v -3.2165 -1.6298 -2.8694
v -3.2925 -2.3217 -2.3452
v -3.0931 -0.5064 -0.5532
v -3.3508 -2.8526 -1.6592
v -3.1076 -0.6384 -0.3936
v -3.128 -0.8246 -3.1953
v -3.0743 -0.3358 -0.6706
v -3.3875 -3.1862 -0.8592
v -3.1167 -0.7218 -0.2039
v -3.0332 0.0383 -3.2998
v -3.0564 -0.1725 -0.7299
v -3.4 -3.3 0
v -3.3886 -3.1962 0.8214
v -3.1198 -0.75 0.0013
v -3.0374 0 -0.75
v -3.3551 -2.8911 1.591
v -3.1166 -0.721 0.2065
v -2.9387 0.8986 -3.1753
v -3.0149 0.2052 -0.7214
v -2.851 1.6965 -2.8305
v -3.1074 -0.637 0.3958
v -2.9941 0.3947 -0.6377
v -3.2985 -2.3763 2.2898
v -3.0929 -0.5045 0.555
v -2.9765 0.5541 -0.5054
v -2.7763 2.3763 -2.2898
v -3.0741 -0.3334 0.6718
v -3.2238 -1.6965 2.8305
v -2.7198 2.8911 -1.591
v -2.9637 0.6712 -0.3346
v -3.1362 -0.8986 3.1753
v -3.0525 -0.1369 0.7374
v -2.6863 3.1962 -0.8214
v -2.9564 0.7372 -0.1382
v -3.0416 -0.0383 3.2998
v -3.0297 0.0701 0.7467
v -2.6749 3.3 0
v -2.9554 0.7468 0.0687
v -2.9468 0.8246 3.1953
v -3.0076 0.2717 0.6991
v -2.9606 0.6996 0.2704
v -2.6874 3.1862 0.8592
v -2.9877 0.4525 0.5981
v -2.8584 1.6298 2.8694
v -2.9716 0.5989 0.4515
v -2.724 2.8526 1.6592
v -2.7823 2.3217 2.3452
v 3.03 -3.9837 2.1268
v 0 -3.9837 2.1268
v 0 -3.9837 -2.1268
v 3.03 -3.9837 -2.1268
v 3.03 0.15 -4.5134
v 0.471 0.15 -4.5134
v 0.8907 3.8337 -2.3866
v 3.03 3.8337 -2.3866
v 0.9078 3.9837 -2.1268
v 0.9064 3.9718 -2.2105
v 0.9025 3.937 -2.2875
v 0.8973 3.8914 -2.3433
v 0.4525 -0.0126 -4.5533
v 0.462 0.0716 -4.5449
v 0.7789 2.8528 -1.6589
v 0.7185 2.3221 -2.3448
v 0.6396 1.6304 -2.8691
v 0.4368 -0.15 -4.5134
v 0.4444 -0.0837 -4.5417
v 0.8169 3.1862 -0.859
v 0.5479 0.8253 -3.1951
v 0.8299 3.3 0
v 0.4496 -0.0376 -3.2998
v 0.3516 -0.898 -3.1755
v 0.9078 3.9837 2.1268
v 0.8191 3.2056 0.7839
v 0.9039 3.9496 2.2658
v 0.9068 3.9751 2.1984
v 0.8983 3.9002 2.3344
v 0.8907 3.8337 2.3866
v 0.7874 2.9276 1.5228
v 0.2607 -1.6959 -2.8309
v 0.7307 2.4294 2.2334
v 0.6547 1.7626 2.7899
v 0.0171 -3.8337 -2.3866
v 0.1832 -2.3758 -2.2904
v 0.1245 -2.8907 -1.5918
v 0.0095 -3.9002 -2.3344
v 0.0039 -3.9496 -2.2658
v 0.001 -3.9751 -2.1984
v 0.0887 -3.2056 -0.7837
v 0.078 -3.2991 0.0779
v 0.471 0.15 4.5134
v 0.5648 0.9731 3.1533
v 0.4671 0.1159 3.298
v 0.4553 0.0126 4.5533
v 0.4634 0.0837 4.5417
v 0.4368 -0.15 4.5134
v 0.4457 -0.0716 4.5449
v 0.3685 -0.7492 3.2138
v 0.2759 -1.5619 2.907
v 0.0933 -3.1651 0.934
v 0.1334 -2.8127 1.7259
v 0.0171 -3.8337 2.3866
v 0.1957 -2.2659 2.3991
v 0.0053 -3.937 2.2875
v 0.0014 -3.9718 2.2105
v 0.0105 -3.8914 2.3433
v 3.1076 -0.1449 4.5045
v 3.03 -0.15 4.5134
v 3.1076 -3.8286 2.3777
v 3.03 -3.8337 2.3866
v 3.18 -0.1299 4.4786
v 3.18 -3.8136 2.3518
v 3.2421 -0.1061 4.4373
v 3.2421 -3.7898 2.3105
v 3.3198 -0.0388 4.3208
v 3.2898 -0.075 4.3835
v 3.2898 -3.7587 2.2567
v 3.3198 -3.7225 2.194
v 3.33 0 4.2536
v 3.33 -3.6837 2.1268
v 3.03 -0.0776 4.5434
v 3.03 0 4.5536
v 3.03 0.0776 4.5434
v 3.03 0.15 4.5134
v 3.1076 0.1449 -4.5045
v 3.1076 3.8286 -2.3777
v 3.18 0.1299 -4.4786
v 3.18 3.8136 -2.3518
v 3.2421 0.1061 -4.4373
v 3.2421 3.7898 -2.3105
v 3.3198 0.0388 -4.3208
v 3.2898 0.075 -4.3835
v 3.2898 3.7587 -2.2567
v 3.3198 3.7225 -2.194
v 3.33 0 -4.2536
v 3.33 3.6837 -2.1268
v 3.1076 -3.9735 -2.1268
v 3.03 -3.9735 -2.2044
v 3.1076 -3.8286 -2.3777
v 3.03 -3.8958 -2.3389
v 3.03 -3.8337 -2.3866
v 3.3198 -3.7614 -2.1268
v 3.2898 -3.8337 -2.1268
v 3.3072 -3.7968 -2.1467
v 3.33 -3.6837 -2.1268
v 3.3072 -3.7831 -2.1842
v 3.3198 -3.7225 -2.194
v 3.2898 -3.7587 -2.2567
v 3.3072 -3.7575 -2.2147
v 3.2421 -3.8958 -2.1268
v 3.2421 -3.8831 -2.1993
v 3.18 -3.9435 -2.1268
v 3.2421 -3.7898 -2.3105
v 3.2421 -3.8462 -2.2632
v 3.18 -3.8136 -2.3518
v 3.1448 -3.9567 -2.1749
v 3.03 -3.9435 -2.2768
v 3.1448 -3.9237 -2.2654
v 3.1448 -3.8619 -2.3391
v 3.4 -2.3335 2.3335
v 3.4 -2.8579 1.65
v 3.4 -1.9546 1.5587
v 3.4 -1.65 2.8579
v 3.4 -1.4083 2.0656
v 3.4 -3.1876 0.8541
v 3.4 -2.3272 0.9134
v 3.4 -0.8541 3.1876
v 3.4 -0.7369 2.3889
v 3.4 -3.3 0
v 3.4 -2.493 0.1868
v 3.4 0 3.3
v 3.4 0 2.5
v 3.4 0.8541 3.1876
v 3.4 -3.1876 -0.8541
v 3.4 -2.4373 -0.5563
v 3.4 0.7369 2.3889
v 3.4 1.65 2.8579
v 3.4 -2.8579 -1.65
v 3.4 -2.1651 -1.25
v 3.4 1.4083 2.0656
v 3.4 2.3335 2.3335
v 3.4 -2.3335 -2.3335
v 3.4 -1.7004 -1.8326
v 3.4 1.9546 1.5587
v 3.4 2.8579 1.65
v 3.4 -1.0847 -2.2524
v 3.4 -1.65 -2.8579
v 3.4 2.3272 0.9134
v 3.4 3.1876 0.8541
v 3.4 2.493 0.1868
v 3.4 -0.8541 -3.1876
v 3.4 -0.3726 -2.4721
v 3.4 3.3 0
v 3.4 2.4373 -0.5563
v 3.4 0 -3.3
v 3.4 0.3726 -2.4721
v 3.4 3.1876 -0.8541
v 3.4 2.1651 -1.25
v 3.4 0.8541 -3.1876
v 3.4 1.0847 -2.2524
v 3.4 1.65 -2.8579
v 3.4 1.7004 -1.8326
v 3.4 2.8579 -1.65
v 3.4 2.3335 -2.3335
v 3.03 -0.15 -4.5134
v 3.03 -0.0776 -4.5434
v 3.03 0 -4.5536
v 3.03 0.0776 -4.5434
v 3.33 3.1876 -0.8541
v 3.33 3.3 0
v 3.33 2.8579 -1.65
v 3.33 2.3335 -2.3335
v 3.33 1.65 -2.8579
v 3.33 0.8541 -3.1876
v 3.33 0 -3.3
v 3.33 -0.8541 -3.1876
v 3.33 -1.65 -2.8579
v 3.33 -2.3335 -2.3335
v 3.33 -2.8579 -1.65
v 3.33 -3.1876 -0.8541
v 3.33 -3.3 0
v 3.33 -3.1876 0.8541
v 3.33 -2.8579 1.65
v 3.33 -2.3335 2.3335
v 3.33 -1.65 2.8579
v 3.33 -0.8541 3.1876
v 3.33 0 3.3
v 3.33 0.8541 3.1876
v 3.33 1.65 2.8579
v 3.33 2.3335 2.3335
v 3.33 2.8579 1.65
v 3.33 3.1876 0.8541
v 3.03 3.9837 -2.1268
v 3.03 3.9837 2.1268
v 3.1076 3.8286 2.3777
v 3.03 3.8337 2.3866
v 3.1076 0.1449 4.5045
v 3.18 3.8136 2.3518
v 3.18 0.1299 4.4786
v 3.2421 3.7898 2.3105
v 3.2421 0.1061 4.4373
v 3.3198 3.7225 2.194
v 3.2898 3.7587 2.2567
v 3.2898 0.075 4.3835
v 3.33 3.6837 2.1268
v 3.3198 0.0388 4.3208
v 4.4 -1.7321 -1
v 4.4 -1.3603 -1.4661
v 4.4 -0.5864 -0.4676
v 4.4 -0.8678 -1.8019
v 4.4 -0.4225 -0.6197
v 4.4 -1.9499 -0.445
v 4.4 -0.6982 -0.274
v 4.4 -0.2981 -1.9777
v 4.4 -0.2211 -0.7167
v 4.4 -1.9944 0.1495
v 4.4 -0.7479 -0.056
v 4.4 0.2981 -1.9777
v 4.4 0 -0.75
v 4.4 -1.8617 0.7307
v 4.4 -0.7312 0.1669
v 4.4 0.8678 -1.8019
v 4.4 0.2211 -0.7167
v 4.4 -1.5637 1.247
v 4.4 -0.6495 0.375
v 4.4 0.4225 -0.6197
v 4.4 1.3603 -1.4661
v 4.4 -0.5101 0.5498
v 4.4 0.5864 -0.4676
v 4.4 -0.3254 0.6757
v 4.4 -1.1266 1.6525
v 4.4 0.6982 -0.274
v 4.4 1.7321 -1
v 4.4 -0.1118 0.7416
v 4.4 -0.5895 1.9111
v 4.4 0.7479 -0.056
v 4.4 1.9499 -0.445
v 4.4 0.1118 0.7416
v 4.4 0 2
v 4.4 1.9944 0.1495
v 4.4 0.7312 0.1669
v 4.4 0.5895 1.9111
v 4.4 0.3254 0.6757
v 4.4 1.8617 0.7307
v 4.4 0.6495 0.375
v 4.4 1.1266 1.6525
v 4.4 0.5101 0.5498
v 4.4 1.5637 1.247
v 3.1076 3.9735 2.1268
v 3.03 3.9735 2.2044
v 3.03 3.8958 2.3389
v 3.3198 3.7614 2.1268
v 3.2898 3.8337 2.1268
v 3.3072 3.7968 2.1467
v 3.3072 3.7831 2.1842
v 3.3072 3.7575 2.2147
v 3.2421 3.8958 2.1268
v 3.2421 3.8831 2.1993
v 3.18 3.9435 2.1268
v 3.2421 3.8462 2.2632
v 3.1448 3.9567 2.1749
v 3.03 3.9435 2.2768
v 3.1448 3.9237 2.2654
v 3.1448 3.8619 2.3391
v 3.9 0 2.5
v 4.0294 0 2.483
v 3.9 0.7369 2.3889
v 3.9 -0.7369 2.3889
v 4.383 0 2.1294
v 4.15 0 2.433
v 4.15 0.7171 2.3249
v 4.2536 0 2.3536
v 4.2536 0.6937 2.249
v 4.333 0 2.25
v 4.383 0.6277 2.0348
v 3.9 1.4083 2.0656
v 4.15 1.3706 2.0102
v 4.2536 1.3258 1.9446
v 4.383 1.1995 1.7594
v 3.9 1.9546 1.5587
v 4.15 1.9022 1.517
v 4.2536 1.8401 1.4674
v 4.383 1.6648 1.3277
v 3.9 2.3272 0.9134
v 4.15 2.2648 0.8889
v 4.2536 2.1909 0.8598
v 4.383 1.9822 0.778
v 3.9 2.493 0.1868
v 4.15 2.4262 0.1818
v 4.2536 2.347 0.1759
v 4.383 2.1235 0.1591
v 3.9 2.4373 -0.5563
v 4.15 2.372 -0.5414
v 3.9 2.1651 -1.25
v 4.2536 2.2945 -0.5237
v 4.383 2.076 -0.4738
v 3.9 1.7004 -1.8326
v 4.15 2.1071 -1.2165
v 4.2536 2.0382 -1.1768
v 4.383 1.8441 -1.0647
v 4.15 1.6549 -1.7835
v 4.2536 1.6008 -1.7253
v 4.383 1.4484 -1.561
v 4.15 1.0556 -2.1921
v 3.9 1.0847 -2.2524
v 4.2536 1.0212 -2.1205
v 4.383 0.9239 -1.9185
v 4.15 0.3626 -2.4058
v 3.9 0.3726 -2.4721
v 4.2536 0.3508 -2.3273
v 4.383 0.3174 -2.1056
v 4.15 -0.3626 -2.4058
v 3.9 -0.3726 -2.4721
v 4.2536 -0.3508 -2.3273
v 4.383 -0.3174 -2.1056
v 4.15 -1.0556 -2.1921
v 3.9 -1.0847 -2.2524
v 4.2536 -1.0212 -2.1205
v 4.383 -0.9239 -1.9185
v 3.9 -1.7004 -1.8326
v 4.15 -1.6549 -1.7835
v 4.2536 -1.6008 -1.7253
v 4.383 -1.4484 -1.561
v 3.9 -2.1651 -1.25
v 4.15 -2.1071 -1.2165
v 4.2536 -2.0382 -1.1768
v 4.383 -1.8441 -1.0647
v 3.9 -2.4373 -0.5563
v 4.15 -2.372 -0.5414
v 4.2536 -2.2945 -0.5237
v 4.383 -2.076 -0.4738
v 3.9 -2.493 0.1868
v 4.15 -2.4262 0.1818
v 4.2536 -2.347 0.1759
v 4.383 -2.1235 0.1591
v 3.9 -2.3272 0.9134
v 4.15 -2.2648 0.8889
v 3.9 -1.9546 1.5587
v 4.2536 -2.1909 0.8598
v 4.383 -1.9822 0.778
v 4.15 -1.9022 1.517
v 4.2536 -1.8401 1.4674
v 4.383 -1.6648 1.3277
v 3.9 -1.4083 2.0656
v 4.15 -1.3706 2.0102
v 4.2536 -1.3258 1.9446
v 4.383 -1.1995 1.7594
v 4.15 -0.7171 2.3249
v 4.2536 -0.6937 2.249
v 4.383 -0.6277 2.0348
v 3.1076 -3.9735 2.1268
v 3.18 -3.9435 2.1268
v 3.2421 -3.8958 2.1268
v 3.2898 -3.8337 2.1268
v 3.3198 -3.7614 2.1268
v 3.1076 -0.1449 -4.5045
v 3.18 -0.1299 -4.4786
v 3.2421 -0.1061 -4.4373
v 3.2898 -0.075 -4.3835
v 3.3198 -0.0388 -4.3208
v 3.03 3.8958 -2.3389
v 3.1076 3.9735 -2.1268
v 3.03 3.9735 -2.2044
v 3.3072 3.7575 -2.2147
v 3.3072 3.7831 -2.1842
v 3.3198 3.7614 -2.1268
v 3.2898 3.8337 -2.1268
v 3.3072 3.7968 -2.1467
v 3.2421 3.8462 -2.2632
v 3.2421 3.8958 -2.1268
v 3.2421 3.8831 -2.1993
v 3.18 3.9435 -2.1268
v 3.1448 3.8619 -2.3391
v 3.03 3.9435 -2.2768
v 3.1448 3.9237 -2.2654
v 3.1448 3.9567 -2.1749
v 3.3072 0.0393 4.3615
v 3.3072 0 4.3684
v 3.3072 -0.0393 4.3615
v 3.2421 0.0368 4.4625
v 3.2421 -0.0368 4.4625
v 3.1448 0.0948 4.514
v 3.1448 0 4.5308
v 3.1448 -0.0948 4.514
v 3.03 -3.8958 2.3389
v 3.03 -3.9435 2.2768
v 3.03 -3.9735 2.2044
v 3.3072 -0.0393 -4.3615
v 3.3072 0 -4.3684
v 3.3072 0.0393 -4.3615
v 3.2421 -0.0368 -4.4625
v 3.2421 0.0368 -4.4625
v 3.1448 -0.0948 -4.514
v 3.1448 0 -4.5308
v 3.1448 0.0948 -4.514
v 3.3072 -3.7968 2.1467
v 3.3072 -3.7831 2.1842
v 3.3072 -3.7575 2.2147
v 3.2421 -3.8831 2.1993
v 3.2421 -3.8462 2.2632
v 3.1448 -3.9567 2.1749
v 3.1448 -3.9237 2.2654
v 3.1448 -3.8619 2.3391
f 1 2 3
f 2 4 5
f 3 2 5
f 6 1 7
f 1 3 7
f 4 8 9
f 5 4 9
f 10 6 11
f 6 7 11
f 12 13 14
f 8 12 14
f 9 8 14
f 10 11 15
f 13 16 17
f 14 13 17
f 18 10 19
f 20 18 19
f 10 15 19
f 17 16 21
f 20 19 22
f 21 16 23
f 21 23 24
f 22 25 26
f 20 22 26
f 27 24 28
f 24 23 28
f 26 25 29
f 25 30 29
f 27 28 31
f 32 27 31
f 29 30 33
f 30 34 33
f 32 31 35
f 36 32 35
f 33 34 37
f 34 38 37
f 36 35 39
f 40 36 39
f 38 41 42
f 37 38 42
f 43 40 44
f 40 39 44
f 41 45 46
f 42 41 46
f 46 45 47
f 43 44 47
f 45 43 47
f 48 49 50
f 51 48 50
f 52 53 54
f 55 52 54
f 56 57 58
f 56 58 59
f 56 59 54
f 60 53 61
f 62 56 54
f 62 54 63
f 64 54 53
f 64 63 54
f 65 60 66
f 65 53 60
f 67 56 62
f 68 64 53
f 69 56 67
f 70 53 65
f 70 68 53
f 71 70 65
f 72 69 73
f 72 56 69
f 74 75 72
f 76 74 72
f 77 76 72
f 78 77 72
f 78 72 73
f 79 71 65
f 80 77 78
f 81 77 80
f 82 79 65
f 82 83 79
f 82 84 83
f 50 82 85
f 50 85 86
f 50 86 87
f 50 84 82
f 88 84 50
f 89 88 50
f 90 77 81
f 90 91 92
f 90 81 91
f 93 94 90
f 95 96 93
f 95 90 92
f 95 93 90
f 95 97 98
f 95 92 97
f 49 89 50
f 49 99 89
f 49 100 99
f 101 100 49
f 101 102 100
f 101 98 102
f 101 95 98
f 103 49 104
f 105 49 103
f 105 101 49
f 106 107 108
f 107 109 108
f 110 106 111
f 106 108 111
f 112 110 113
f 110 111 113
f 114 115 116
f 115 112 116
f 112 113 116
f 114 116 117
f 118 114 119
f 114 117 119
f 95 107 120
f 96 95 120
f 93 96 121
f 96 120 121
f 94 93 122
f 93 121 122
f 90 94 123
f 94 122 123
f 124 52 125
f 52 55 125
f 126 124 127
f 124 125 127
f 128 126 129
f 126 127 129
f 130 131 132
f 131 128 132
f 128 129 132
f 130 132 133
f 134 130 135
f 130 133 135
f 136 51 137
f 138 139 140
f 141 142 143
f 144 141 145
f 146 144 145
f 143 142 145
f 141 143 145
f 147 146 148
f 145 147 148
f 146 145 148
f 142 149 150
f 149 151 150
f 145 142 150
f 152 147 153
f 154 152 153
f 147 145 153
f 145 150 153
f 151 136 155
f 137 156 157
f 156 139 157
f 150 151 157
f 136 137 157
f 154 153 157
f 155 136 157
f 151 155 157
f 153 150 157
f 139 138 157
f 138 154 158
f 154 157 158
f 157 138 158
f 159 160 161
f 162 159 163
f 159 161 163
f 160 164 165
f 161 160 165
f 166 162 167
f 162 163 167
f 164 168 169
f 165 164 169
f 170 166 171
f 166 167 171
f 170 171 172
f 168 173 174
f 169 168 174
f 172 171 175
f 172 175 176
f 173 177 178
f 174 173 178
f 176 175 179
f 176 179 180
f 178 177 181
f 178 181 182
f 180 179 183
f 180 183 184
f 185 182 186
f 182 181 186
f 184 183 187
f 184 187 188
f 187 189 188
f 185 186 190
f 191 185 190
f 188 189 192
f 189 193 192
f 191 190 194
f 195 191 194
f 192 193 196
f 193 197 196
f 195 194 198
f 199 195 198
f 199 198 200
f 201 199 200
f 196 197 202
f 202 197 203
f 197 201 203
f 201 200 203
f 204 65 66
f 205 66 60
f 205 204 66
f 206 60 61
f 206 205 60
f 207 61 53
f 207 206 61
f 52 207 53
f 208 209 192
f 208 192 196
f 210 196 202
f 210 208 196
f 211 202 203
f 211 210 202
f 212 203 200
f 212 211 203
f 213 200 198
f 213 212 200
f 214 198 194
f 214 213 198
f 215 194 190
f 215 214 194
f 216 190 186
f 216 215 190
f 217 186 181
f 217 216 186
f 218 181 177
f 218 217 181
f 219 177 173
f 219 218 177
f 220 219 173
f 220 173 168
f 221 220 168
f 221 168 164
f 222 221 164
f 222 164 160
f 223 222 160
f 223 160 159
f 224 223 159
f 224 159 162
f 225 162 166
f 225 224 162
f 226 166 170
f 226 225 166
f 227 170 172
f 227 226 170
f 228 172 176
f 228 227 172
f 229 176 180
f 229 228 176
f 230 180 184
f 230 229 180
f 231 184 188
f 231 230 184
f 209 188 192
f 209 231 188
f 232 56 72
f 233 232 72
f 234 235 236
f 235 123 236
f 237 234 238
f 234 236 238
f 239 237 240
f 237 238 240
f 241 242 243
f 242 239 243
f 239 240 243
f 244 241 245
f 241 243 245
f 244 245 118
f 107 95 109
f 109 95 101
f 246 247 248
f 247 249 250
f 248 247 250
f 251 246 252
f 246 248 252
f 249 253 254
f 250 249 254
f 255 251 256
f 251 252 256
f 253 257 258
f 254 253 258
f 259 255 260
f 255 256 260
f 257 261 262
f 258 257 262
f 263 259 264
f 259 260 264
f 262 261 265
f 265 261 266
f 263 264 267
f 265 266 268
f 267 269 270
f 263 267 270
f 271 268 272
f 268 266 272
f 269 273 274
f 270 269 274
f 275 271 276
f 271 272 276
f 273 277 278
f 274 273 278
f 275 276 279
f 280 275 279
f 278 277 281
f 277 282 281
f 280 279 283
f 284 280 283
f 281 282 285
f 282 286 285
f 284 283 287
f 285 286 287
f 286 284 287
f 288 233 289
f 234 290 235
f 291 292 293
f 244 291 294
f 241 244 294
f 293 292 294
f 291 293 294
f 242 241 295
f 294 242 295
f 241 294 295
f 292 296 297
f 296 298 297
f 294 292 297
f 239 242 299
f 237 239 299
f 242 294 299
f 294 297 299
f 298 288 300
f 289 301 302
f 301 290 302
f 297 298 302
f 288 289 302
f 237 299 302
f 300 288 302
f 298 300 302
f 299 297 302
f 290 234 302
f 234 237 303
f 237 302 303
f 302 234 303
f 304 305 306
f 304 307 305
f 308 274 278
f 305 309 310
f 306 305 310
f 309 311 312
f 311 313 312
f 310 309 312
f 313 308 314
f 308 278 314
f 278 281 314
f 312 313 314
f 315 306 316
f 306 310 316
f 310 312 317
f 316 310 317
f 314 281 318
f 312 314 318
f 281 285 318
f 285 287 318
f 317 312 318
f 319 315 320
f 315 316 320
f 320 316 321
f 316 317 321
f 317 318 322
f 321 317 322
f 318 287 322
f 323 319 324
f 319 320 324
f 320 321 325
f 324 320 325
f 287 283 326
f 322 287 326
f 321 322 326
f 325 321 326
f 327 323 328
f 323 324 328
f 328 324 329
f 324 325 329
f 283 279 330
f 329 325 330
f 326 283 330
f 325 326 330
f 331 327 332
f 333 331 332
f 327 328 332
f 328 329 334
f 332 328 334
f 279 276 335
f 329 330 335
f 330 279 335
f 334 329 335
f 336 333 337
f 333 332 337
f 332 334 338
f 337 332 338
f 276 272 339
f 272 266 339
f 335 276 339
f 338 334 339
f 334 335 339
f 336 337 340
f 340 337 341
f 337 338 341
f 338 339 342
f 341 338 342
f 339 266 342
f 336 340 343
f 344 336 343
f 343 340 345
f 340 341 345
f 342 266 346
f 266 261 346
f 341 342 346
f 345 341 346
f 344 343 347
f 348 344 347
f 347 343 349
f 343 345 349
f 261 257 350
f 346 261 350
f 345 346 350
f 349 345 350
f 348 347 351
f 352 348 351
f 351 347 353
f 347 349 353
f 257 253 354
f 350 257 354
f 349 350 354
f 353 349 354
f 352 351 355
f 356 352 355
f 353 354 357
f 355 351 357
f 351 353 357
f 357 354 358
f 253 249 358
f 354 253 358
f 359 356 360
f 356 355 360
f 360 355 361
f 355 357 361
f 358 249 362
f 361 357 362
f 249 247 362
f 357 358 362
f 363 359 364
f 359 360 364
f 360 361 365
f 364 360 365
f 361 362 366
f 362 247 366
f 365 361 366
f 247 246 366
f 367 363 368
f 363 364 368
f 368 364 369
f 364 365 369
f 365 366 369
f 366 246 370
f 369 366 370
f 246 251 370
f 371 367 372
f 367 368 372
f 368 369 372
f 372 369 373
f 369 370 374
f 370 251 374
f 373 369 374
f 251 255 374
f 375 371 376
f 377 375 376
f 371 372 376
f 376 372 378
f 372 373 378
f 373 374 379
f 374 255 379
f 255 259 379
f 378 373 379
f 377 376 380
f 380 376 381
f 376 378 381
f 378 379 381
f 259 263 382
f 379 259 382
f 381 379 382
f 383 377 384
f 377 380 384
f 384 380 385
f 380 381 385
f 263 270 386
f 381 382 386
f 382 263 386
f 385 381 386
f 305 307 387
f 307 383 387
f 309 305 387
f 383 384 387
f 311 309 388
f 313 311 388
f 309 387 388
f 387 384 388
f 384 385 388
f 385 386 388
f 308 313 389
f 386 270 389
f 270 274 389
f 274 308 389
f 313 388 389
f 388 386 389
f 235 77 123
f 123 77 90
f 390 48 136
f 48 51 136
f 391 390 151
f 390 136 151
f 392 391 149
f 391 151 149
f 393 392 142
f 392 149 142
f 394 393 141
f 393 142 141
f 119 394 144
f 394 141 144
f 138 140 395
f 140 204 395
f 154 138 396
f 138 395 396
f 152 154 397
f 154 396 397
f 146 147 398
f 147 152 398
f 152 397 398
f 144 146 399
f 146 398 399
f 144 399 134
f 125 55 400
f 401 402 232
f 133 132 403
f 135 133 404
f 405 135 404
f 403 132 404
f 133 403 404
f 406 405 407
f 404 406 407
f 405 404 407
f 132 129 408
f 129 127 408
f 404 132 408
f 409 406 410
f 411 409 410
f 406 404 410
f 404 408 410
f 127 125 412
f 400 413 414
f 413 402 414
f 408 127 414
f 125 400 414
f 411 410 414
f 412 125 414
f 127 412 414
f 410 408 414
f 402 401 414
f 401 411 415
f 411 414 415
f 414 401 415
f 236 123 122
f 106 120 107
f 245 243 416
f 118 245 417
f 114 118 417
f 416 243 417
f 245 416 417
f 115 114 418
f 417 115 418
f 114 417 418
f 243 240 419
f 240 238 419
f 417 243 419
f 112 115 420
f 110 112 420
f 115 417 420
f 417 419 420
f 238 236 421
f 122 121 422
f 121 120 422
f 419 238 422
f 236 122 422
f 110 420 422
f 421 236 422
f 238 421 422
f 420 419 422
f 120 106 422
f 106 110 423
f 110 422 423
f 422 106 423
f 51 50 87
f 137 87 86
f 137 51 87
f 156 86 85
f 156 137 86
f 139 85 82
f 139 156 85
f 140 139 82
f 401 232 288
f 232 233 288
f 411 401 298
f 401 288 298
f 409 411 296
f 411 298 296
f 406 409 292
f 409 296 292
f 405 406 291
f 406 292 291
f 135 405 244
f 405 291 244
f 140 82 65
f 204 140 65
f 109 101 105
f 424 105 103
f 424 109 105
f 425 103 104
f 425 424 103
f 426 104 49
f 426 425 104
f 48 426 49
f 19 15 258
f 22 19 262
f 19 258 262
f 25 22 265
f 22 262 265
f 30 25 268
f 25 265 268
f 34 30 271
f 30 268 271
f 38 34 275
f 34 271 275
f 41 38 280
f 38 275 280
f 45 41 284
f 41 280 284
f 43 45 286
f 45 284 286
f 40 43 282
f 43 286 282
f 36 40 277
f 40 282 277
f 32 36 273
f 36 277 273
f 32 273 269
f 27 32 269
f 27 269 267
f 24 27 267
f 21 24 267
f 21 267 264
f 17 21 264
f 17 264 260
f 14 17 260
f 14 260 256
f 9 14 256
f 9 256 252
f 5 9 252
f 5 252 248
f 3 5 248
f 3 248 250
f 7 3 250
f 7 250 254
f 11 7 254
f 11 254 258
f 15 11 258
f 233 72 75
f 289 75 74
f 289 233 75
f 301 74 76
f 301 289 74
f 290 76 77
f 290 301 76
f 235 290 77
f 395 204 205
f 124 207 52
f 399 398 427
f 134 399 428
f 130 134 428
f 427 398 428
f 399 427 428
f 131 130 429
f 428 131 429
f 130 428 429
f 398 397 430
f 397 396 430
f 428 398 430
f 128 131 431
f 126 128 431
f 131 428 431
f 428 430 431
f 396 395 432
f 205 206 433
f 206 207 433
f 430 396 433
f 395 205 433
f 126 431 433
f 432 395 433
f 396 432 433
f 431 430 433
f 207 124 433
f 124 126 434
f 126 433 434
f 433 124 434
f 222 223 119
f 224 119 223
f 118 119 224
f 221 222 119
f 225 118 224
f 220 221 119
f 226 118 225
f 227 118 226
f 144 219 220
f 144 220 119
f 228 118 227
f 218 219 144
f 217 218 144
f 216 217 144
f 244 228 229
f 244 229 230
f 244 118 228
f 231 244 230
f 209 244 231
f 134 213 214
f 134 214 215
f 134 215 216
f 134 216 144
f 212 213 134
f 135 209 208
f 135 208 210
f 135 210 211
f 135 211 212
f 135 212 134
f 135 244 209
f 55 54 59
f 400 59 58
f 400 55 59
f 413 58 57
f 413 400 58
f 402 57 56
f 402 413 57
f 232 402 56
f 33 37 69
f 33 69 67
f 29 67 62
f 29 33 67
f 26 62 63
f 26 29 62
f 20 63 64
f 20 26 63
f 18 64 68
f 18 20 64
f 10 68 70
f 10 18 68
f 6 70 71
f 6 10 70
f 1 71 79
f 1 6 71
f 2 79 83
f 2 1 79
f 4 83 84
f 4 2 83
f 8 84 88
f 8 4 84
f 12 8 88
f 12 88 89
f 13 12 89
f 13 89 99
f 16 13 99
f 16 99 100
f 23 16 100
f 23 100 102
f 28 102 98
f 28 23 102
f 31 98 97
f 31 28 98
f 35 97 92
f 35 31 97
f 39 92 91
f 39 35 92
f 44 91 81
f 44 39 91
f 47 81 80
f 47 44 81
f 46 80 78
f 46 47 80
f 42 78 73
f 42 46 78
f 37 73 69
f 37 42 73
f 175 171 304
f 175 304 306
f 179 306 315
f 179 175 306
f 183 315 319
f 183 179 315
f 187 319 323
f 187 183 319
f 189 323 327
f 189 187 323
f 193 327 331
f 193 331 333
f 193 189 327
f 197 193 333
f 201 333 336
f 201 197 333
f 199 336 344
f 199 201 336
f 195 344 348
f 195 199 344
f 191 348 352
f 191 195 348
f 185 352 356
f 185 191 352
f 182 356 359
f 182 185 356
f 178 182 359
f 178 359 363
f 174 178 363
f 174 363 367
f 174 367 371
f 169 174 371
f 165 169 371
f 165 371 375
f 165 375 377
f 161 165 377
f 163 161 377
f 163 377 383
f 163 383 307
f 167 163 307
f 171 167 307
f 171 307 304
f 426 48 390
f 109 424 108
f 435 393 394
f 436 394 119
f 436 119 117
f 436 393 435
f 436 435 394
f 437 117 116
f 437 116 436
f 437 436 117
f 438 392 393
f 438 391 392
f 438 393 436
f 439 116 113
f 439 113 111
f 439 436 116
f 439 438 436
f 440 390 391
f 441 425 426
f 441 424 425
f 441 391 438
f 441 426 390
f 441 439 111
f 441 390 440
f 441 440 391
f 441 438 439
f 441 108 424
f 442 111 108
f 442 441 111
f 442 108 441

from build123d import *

# Parameters (mm, degrees)
SALIENTE_EXTRUIR1_DEPTH = 3.33
REDONDEO1_R             = 0.3
CORTAR_EXTRUIR3_DEPTH   = 9.95
CROQUIS2_R              = 3.3
SALIENTE_EXTRUIR4_DEPTH = 3.4
CROQUIS6_R              = 2.5
SALIENTE_EXTRUIR5_DEPTH = 7.8
REDONDEO3_R             = 0.5
CROQUIS7_R              = 0.75
CORTAR_EXTRUIR4_DEPTH   = 10.871432541
CORTAR_EXTRUIR5_DEPTH   = 3.9


with BuildPart() as part:
    # Croquis1 → Saliente-Extruir1 (new body)
    with BuildSketch(Plane(origin=(0, 0, 0), x_dir=(0, 0, -1), z_dir=(1, 0, 0))):
        Polygon((-4.6, 0), (-2.3, -3.983716857), (2.3, -3.983716857), (4.6, 0), (2.3, 3.983716857), (-2.3, 3.983716857), align=None)
    extrude(amount=SALIENTE_EXTRUIR1_DEPTH)

    # Redondeo1
    redondeo1_edges = [part.edges().sort_by_distance(p)[0] for p in [
        (1.665, 3.983716857, 2.3),
        (1.665, 3.983716857, -2.3),
        (1.665, 0, -4.6),
        (1.665, -3.983716857, -2.3),
        (1.665, -3.983716857, 2.3),
        (1.665, 0, 4.6),
        (3.33, -3.983716857, 0),
        (3.33, -1.991858429, -3.45),
        (3.33, 1.991858429, -3.45),
        (3.33, 3.983716857, 0),
        (3.33, 1.991858429, 3.45),
        (3.33, -1.991858429, 3.45),
    ]]
    fillet(redondeo1_edges, radius=REDONDEO1_R)

    # Croquis5 → Cortar-Extruir3 (cut, symmetric)
    with BuildSketch(Plane.XY):
        Polygon((0, -3.983716857), (-2.185194876, -3.983716857), (-2.185194876, 4.171179011), (0.929133021, 4.171179011), align=None)
    extrude(amount=CORTAR_EXTRUIR3_DEPTH, both=True, mode=Mode.SUBTRACT)

    # Croquis2 → Saliente-Extruir4 (add, symmetric)
    with BuildSketch(Plane.ZY):
        with Locations(Location((0, 0, 0), (0, 0, 90))):
            Circle(CROQUIS2_R)
    extrude(amount=SALIENTE_EXTRUIR4_DEPTH, both=True)

    # Croquis6 → Saliente-Extruir5 (add)
    with BuildSketch(Plane.ZY.offset(3.4)):
        Circle(CROQUIS6_R)
    extrude(amount=-SALIENTE_EXTRUIR5_DEPTH)

    # Redondeo3
    redondeo3_edges = [part.edges().sort_by_distance(p)[0] for p in [
        (4.4, 0, -2.5),
    ]]
    fillet(redondeo3_edges, radius=REDONDEO3_R)

    # Croquis7 → Cortar-Extruir4 (cut, through all)
    with BuildSketch(Plane(origin=(4.4, 0, 0), x_dir=(0, 0, -1), z_dir=(1, 0, 0))):
        Circle(CROQUIS7_R)
    extrude(amount=-CORTAR_EXTRUIR4_DEPTH, mode=Mode.SUBTRACT)

    # Croquis8 → Cortar-Extruir5 (cut, symmetric)
    with BuildSketch(Plane.XY):
        Polygon((-3.4, -3.3), (-2.582609663, 4.139540535), (-3.4, 4.139540535), align=None)
    extrude(amount=CORTAR_EXTRUIR5_DEPTH, both=True, mode=Mode.SUBTRACT)


solid = part.part
